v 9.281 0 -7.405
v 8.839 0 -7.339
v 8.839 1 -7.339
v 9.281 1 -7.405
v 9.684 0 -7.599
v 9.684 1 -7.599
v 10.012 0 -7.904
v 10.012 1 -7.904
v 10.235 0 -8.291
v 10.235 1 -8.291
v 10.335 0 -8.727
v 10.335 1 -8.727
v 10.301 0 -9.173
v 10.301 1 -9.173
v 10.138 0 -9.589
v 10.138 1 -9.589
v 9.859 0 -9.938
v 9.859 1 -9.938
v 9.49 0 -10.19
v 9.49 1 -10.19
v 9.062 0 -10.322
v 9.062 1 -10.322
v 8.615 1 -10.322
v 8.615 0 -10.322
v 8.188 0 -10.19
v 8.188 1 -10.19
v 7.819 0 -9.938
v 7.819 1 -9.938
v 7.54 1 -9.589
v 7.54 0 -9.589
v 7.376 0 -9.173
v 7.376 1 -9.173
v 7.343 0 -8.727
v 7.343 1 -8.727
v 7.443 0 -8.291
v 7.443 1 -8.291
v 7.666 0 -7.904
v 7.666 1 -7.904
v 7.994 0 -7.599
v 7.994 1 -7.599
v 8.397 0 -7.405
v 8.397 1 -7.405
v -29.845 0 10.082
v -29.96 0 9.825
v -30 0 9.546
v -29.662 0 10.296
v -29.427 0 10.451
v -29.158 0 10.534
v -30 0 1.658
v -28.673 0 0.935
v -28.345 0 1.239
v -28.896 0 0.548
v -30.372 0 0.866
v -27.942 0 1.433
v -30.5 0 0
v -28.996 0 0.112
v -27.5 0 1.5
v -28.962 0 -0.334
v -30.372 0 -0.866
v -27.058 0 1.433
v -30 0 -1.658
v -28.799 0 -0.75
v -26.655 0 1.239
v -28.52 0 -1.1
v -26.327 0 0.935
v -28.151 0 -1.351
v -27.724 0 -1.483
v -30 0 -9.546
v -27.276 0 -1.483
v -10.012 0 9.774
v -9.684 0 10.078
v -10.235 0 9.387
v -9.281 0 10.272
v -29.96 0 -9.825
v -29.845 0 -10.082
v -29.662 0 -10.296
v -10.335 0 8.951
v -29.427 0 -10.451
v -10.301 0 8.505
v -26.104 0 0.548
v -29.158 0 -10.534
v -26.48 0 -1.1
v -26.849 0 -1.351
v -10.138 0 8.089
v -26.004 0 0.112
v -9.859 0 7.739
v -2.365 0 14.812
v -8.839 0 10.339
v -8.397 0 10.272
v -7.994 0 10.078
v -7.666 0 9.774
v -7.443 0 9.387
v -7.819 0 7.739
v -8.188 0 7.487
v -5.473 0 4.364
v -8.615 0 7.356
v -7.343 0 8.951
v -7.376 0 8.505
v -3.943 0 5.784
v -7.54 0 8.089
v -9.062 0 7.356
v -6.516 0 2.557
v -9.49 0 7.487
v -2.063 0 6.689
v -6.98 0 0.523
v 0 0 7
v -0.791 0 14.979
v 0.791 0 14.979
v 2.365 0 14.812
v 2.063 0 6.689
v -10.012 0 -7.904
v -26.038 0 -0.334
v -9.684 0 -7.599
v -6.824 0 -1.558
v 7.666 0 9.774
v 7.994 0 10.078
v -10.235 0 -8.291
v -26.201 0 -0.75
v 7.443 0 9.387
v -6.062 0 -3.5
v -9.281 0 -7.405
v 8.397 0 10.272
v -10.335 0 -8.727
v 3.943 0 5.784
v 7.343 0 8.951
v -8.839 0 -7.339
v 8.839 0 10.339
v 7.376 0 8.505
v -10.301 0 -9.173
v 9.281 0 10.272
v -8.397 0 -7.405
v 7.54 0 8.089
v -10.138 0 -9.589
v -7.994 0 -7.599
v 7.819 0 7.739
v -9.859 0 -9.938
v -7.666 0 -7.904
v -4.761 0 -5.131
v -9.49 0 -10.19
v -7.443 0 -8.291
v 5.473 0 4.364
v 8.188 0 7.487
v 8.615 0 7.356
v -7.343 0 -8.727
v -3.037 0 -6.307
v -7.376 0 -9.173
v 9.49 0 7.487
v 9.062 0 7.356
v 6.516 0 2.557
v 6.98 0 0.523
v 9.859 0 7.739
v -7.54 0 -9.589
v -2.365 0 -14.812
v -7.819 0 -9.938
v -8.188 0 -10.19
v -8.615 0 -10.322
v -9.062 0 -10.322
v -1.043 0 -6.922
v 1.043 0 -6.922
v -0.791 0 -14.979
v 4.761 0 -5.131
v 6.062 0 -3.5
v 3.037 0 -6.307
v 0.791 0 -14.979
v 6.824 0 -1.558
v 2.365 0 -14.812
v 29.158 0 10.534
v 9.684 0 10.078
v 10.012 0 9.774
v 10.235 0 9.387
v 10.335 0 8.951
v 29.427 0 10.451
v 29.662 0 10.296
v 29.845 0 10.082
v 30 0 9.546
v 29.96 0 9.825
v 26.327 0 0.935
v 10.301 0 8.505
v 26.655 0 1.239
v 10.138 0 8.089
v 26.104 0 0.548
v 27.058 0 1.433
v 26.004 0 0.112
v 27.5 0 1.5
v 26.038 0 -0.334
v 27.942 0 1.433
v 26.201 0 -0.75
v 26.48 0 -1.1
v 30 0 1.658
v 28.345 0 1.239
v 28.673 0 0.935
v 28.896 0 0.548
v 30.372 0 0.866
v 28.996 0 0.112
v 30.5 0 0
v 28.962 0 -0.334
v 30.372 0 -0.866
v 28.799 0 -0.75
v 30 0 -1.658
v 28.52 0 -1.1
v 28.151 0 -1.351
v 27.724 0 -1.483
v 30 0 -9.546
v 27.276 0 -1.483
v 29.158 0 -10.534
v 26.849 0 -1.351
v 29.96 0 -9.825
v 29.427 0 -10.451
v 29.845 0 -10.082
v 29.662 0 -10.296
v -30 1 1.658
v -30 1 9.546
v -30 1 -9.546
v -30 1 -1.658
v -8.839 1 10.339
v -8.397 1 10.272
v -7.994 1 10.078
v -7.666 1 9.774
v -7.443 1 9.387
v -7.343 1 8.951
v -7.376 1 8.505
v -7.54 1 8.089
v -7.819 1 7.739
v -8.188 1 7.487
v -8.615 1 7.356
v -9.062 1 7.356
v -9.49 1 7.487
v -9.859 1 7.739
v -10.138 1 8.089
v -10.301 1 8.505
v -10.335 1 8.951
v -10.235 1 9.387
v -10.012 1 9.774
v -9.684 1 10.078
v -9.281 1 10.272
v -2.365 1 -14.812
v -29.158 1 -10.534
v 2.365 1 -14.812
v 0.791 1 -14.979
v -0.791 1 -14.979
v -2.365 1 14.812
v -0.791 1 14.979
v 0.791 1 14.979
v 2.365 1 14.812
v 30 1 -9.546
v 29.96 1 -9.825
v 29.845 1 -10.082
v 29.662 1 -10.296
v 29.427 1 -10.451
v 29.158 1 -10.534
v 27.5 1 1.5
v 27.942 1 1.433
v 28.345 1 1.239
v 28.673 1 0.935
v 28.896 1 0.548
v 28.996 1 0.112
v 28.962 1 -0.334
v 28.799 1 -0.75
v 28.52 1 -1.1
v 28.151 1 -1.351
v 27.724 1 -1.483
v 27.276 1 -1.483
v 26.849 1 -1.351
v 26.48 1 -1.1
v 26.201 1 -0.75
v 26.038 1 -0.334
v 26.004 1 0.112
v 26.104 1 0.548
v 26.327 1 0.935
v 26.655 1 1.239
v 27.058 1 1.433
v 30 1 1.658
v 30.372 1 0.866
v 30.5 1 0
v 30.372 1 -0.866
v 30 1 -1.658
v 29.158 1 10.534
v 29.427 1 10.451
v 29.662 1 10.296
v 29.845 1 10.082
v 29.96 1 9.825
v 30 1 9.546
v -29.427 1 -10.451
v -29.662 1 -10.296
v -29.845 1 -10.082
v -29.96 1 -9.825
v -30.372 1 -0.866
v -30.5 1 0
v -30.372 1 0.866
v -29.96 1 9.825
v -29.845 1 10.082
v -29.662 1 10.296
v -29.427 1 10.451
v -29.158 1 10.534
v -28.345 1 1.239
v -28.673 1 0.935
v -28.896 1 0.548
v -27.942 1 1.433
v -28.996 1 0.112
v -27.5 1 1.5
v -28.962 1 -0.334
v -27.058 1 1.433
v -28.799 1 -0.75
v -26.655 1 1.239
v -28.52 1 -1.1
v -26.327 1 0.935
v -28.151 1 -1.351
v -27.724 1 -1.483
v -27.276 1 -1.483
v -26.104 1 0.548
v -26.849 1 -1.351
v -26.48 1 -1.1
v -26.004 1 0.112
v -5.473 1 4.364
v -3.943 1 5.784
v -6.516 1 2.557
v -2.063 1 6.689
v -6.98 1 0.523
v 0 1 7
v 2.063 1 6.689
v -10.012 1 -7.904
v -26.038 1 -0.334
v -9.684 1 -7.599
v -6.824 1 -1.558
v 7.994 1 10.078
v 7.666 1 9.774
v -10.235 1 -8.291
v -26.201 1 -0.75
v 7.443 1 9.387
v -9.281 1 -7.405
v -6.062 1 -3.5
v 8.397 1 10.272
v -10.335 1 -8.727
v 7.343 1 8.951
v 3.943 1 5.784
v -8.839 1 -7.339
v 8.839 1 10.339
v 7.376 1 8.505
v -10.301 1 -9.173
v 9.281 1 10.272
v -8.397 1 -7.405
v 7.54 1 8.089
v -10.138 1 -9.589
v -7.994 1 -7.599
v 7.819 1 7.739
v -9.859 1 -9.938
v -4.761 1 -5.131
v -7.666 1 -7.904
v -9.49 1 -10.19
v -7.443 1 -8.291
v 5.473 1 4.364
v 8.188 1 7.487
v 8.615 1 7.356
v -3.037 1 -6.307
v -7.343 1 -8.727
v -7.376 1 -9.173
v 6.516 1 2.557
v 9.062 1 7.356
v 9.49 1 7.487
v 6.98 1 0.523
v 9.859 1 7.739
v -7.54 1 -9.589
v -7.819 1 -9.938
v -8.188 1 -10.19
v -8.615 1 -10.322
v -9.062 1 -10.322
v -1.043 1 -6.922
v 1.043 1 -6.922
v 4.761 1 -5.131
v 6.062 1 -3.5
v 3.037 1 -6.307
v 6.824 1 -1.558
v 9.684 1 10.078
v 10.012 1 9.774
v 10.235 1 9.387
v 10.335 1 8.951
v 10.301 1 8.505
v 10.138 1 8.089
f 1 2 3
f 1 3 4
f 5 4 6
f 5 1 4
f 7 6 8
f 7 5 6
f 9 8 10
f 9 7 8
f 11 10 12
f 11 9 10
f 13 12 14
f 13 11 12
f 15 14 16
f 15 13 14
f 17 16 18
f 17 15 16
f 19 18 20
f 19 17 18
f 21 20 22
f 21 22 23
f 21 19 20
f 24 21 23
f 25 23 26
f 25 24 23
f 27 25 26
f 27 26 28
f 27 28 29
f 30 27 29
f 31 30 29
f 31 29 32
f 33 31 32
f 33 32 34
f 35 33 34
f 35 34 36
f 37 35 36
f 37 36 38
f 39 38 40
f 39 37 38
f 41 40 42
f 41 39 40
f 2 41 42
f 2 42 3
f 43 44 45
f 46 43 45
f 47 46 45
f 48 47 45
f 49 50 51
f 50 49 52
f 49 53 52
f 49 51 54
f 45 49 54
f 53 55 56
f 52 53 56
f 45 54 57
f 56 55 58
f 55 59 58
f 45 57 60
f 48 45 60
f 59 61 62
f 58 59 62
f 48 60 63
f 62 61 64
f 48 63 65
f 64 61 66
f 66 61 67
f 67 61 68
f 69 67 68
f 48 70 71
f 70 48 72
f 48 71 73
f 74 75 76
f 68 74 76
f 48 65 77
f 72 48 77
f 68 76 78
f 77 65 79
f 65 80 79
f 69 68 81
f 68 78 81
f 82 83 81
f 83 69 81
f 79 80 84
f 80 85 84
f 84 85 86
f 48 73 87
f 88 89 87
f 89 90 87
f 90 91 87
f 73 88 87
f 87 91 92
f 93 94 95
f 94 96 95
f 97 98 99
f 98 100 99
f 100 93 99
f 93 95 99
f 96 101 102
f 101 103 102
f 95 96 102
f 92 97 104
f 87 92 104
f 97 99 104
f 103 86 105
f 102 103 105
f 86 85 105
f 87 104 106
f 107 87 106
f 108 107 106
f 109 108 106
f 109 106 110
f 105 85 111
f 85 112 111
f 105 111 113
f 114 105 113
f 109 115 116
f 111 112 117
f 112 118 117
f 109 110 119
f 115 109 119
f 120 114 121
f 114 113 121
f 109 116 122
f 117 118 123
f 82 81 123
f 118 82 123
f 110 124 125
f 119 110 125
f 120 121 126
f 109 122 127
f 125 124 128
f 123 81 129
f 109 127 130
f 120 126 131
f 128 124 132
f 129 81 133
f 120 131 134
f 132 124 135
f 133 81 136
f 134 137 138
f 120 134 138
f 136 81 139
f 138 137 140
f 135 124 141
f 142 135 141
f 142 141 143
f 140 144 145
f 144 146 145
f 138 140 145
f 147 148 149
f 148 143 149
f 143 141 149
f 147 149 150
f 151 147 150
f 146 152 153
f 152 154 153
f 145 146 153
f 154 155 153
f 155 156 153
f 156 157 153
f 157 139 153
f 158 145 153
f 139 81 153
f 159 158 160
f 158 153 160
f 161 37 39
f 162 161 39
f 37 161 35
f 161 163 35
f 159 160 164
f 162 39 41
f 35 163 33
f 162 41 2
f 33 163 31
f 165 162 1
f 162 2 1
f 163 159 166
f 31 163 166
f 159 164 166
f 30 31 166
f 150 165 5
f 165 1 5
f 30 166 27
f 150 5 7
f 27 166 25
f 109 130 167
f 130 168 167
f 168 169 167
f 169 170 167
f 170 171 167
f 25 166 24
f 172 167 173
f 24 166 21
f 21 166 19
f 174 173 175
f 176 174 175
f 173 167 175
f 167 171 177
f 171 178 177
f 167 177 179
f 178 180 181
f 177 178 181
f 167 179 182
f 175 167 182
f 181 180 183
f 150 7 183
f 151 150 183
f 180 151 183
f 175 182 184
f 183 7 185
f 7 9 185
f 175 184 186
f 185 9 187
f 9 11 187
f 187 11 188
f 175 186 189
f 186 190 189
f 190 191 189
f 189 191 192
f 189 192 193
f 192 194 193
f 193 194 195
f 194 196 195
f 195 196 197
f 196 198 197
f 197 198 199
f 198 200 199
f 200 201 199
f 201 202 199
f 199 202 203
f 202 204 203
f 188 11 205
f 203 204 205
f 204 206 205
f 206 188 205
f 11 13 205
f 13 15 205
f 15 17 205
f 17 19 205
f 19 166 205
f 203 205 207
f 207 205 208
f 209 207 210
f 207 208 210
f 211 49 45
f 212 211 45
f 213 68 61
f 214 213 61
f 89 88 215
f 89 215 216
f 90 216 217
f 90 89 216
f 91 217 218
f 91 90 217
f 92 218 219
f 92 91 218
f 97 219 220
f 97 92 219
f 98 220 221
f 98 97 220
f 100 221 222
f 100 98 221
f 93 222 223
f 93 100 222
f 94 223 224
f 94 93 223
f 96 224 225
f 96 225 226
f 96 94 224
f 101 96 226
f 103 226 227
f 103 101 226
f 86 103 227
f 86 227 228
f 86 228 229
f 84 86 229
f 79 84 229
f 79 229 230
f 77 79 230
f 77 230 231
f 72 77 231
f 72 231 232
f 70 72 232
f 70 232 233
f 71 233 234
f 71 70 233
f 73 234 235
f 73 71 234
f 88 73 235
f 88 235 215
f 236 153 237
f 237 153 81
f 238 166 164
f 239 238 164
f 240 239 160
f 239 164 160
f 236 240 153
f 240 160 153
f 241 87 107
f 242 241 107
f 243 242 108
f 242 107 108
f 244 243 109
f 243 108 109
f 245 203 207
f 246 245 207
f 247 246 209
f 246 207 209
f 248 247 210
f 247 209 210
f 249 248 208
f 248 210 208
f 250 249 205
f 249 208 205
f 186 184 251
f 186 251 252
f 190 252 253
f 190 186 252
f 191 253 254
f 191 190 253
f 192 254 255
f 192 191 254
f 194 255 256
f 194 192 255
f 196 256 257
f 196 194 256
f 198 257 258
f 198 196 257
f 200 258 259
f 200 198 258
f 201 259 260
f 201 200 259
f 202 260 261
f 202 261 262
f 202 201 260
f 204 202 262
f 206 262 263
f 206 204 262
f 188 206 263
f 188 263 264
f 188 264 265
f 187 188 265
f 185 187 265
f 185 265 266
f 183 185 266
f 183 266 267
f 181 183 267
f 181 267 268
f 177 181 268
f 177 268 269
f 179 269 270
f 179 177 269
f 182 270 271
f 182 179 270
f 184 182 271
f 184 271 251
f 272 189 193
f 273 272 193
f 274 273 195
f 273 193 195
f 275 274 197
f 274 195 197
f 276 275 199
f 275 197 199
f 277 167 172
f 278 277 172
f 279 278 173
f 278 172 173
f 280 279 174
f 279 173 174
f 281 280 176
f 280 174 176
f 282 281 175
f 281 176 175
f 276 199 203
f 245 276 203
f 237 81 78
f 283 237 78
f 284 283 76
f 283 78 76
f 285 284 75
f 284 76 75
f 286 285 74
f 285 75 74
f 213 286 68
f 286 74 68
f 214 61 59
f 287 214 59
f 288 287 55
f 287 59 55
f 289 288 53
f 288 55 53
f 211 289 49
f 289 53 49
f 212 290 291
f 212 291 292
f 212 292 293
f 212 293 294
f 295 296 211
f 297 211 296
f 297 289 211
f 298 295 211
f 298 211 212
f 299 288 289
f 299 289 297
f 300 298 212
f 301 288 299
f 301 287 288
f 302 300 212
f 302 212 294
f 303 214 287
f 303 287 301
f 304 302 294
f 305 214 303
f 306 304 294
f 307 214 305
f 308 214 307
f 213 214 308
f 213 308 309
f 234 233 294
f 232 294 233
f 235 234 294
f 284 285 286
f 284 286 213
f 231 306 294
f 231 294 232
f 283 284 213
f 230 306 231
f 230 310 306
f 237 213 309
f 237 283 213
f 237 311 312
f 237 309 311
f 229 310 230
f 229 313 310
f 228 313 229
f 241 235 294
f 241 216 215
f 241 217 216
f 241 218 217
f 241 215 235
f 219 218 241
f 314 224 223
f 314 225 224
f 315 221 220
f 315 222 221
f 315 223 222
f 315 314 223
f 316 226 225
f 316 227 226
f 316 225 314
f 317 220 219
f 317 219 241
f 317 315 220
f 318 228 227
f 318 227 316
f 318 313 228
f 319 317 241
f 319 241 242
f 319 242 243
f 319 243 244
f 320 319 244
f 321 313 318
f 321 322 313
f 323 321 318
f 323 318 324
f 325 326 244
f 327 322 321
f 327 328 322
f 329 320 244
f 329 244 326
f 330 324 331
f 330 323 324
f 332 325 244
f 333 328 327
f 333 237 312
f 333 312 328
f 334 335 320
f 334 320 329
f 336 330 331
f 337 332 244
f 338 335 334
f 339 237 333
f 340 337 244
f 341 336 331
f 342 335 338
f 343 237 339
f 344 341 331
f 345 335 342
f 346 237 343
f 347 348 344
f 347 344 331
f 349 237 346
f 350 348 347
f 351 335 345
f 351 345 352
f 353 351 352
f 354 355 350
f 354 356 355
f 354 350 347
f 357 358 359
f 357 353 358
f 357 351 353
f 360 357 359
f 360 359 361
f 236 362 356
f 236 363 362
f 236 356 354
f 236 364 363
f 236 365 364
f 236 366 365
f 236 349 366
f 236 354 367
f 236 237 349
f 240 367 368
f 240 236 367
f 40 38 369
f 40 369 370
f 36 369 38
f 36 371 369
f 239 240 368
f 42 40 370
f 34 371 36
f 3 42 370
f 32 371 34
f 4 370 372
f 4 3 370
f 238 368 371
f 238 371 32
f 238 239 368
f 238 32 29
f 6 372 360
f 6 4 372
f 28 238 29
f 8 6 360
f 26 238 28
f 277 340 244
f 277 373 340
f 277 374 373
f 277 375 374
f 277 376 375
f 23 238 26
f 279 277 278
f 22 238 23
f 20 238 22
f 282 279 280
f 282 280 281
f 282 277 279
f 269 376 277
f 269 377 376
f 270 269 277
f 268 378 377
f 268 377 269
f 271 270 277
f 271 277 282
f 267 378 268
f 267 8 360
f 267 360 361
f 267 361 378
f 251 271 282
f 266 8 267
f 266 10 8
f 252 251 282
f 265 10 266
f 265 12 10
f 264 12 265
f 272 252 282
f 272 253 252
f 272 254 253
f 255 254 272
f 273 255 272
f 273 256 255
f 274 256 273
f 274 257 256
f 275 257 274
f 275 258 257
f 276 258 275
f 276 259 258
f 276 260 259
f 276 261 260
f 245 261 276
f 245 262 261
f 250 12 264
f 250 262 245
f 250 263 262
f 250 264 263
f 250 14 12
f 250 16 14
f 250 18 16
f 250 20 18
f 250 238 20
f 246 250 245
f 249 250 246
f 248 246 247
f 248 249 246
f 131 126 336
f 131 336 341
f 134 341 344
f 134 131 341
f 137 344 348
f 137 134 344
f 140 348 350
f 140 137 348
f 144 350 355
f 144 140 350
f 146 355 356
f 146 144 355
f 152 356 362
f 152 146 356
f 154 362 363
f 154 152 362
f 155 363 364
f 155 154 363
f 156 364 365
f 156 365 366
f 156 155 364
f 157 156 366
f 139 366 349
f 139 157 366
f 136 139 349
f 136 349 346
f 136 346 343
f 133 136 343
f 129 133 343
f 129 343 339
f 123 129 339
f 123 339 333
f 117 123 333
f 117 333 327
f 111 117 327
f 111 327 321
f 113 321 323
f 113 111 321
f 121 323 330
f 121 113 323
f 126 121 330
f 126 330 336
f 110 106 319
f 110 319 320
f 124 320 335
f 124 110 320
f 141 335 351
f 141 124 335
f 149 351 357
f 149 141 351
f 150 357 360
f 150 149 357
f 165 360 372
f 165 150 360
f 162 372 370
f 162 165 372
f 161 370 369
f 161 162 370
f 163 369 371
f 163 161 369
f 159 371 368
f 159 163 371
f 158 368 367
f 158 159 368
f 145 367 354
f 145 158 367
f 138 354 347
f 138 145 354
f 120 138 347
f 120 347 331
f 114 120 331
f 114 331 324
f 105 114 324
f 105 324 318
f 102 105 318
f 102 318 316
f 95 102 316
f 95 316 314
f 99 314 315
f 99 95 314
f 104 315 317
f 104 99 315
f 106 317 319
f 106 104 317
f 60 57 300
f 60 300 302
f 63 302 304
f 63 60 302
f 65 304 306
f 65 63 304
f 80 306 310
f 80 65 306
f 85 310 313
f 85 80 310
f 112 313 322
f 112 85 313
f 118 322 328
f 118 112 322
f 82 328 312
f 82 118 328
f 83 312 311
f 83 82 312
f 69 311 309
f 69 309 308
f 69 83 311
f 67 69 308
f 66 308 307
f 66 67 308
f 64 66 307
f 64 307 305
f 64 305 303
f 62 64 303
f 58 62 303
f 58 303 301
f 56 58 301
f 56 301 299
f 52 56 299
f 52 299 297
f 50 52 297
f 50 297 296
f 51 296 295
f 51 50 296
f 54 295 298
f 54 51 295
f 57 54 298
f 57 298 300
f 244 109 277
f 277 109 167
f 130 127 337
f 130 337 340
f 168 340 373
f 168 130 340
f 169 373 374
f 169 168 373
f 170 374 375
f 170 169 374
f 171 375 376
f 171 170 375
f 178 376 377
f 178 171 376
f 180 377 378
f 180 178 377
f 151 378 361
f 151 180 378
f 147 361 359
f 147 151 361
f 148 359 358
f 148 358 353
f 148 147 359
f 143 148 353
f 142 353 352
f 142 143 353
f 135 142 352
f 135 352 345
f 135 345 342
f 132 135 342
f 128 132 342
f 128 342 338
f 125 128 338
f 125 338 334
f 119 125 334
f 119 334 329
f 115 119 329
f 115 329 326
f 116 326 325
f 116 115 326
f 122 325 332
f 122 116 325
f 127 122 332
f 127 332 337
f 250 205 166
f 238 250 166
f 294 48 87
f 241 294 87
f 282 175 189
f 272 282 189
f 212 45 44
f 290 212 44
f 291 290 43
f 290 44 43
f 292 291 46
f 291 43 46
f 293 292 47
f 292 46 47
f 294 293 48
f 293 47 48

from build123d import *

# Parameters (mm, degrees)
SKETCH1_R           = 1.5
SKETCH1_R_2         = 7
BOSS_EXTRUDE1_DEPTH = 1


with BuildPart() as part:
    # Sketch1 → Boss-Extrude1 (new body)
    with BuildSketch(Plane(origin=(0, 0, 0), x_dir=(1, 0, 0), z_dir=(0, 1, 0))):
        with BuildLine():
            Line((-2.365441422, 14.812315379), (-29.157696095, 10.533746677))
            ThreePointArc((-29.157696095, 10.533746677), (-29.760820641, 10.195221197), (-30, 9.546258985))
            Line((-30, 9.546258985), (-30, 1.658312395))
            ThreePointArc((-30, 1.658312395), (-30.5, 0), (-30, -1.658312395))
            Line((-30, -1.658312395), (-30, -9.546258985))
            ThreePointArc((-30, -9.546258985), (-29.760820641, -10.195221197), (-29.157696095, -10.533746677))
            Line((-29.157696095, -10.533746677), (-2.365441422, -14.812315379))
            ThreePointArc((-2.365441422, -14.812315379), (0, -15), (2.365441422, -14.812315379))
            Line((2.365441422, -14.812315379), (29.157696095, -10.533746677))
            ThreePointArc((29.157696095, -10.533746677), (29.760820641, -10.195221197), (30, -9.546258985))
            Line((30, -9.546258985), (30, -1.658312395))
            ThreePointArc((30, -1.658312395), (30.5, 0), (30, 1.658312395))
            Line((30, 1.658312395), (30, 9.546258985))
            ThreePointArc((30, 9.546258985), (29.760820641, 10.195221197), (29.157696095, 10.533746677))
            Line((29.157696095, 10.533746677), (2.365441422, 14.812315379))
            ThreePointArc((2.365441422, 14.812315379), (0, 15), (-2.365441422, 14.812315379))
        make_face()
        with Locations(Location((8.838834765, 8.838834765, 0), (0, 0, 270))):
            Circle(SKETCH1_R, mode=Mode.SUBTRACT)
        with Locations(Location((-8.838834765, -8.838834765, 0), (0, 0, 270))):
            Circle(SKETCH1_R, mode=Mode.SUBTRACT)
        with Locations(Location((8.838834765, -8.838834765, 0), (0, 0, 270))):
            Circle(SKETCH1_R, mode=Mode.SUBTRACT)
        with Locations(Location((0, 0, 0), (0, 0, 270))):
            Circle(SKETCH1_R_2, mode=Mode.SUBTRACT)
        with Locations(Location((-8.838834765, 8.838834765, 0), (0, 0, 270))):
            Circle(SKETCH1_R, mode=Mode.SUBTRACT)
        with Locations(Location((-27.5, 0, 0), (0, 0, 270))):
            Circle(SKETCH1_R, mode=Mode.SUBTRACT)
        with Locations(Location((27.5, 0, 0), (0, 0, 270))):
            Circle(SKETCH1_R, mode=Mode.SUBTRACT)
    extrude(amount=BOSS_EXTRUDE1_DEPTH)


solid = part.part
